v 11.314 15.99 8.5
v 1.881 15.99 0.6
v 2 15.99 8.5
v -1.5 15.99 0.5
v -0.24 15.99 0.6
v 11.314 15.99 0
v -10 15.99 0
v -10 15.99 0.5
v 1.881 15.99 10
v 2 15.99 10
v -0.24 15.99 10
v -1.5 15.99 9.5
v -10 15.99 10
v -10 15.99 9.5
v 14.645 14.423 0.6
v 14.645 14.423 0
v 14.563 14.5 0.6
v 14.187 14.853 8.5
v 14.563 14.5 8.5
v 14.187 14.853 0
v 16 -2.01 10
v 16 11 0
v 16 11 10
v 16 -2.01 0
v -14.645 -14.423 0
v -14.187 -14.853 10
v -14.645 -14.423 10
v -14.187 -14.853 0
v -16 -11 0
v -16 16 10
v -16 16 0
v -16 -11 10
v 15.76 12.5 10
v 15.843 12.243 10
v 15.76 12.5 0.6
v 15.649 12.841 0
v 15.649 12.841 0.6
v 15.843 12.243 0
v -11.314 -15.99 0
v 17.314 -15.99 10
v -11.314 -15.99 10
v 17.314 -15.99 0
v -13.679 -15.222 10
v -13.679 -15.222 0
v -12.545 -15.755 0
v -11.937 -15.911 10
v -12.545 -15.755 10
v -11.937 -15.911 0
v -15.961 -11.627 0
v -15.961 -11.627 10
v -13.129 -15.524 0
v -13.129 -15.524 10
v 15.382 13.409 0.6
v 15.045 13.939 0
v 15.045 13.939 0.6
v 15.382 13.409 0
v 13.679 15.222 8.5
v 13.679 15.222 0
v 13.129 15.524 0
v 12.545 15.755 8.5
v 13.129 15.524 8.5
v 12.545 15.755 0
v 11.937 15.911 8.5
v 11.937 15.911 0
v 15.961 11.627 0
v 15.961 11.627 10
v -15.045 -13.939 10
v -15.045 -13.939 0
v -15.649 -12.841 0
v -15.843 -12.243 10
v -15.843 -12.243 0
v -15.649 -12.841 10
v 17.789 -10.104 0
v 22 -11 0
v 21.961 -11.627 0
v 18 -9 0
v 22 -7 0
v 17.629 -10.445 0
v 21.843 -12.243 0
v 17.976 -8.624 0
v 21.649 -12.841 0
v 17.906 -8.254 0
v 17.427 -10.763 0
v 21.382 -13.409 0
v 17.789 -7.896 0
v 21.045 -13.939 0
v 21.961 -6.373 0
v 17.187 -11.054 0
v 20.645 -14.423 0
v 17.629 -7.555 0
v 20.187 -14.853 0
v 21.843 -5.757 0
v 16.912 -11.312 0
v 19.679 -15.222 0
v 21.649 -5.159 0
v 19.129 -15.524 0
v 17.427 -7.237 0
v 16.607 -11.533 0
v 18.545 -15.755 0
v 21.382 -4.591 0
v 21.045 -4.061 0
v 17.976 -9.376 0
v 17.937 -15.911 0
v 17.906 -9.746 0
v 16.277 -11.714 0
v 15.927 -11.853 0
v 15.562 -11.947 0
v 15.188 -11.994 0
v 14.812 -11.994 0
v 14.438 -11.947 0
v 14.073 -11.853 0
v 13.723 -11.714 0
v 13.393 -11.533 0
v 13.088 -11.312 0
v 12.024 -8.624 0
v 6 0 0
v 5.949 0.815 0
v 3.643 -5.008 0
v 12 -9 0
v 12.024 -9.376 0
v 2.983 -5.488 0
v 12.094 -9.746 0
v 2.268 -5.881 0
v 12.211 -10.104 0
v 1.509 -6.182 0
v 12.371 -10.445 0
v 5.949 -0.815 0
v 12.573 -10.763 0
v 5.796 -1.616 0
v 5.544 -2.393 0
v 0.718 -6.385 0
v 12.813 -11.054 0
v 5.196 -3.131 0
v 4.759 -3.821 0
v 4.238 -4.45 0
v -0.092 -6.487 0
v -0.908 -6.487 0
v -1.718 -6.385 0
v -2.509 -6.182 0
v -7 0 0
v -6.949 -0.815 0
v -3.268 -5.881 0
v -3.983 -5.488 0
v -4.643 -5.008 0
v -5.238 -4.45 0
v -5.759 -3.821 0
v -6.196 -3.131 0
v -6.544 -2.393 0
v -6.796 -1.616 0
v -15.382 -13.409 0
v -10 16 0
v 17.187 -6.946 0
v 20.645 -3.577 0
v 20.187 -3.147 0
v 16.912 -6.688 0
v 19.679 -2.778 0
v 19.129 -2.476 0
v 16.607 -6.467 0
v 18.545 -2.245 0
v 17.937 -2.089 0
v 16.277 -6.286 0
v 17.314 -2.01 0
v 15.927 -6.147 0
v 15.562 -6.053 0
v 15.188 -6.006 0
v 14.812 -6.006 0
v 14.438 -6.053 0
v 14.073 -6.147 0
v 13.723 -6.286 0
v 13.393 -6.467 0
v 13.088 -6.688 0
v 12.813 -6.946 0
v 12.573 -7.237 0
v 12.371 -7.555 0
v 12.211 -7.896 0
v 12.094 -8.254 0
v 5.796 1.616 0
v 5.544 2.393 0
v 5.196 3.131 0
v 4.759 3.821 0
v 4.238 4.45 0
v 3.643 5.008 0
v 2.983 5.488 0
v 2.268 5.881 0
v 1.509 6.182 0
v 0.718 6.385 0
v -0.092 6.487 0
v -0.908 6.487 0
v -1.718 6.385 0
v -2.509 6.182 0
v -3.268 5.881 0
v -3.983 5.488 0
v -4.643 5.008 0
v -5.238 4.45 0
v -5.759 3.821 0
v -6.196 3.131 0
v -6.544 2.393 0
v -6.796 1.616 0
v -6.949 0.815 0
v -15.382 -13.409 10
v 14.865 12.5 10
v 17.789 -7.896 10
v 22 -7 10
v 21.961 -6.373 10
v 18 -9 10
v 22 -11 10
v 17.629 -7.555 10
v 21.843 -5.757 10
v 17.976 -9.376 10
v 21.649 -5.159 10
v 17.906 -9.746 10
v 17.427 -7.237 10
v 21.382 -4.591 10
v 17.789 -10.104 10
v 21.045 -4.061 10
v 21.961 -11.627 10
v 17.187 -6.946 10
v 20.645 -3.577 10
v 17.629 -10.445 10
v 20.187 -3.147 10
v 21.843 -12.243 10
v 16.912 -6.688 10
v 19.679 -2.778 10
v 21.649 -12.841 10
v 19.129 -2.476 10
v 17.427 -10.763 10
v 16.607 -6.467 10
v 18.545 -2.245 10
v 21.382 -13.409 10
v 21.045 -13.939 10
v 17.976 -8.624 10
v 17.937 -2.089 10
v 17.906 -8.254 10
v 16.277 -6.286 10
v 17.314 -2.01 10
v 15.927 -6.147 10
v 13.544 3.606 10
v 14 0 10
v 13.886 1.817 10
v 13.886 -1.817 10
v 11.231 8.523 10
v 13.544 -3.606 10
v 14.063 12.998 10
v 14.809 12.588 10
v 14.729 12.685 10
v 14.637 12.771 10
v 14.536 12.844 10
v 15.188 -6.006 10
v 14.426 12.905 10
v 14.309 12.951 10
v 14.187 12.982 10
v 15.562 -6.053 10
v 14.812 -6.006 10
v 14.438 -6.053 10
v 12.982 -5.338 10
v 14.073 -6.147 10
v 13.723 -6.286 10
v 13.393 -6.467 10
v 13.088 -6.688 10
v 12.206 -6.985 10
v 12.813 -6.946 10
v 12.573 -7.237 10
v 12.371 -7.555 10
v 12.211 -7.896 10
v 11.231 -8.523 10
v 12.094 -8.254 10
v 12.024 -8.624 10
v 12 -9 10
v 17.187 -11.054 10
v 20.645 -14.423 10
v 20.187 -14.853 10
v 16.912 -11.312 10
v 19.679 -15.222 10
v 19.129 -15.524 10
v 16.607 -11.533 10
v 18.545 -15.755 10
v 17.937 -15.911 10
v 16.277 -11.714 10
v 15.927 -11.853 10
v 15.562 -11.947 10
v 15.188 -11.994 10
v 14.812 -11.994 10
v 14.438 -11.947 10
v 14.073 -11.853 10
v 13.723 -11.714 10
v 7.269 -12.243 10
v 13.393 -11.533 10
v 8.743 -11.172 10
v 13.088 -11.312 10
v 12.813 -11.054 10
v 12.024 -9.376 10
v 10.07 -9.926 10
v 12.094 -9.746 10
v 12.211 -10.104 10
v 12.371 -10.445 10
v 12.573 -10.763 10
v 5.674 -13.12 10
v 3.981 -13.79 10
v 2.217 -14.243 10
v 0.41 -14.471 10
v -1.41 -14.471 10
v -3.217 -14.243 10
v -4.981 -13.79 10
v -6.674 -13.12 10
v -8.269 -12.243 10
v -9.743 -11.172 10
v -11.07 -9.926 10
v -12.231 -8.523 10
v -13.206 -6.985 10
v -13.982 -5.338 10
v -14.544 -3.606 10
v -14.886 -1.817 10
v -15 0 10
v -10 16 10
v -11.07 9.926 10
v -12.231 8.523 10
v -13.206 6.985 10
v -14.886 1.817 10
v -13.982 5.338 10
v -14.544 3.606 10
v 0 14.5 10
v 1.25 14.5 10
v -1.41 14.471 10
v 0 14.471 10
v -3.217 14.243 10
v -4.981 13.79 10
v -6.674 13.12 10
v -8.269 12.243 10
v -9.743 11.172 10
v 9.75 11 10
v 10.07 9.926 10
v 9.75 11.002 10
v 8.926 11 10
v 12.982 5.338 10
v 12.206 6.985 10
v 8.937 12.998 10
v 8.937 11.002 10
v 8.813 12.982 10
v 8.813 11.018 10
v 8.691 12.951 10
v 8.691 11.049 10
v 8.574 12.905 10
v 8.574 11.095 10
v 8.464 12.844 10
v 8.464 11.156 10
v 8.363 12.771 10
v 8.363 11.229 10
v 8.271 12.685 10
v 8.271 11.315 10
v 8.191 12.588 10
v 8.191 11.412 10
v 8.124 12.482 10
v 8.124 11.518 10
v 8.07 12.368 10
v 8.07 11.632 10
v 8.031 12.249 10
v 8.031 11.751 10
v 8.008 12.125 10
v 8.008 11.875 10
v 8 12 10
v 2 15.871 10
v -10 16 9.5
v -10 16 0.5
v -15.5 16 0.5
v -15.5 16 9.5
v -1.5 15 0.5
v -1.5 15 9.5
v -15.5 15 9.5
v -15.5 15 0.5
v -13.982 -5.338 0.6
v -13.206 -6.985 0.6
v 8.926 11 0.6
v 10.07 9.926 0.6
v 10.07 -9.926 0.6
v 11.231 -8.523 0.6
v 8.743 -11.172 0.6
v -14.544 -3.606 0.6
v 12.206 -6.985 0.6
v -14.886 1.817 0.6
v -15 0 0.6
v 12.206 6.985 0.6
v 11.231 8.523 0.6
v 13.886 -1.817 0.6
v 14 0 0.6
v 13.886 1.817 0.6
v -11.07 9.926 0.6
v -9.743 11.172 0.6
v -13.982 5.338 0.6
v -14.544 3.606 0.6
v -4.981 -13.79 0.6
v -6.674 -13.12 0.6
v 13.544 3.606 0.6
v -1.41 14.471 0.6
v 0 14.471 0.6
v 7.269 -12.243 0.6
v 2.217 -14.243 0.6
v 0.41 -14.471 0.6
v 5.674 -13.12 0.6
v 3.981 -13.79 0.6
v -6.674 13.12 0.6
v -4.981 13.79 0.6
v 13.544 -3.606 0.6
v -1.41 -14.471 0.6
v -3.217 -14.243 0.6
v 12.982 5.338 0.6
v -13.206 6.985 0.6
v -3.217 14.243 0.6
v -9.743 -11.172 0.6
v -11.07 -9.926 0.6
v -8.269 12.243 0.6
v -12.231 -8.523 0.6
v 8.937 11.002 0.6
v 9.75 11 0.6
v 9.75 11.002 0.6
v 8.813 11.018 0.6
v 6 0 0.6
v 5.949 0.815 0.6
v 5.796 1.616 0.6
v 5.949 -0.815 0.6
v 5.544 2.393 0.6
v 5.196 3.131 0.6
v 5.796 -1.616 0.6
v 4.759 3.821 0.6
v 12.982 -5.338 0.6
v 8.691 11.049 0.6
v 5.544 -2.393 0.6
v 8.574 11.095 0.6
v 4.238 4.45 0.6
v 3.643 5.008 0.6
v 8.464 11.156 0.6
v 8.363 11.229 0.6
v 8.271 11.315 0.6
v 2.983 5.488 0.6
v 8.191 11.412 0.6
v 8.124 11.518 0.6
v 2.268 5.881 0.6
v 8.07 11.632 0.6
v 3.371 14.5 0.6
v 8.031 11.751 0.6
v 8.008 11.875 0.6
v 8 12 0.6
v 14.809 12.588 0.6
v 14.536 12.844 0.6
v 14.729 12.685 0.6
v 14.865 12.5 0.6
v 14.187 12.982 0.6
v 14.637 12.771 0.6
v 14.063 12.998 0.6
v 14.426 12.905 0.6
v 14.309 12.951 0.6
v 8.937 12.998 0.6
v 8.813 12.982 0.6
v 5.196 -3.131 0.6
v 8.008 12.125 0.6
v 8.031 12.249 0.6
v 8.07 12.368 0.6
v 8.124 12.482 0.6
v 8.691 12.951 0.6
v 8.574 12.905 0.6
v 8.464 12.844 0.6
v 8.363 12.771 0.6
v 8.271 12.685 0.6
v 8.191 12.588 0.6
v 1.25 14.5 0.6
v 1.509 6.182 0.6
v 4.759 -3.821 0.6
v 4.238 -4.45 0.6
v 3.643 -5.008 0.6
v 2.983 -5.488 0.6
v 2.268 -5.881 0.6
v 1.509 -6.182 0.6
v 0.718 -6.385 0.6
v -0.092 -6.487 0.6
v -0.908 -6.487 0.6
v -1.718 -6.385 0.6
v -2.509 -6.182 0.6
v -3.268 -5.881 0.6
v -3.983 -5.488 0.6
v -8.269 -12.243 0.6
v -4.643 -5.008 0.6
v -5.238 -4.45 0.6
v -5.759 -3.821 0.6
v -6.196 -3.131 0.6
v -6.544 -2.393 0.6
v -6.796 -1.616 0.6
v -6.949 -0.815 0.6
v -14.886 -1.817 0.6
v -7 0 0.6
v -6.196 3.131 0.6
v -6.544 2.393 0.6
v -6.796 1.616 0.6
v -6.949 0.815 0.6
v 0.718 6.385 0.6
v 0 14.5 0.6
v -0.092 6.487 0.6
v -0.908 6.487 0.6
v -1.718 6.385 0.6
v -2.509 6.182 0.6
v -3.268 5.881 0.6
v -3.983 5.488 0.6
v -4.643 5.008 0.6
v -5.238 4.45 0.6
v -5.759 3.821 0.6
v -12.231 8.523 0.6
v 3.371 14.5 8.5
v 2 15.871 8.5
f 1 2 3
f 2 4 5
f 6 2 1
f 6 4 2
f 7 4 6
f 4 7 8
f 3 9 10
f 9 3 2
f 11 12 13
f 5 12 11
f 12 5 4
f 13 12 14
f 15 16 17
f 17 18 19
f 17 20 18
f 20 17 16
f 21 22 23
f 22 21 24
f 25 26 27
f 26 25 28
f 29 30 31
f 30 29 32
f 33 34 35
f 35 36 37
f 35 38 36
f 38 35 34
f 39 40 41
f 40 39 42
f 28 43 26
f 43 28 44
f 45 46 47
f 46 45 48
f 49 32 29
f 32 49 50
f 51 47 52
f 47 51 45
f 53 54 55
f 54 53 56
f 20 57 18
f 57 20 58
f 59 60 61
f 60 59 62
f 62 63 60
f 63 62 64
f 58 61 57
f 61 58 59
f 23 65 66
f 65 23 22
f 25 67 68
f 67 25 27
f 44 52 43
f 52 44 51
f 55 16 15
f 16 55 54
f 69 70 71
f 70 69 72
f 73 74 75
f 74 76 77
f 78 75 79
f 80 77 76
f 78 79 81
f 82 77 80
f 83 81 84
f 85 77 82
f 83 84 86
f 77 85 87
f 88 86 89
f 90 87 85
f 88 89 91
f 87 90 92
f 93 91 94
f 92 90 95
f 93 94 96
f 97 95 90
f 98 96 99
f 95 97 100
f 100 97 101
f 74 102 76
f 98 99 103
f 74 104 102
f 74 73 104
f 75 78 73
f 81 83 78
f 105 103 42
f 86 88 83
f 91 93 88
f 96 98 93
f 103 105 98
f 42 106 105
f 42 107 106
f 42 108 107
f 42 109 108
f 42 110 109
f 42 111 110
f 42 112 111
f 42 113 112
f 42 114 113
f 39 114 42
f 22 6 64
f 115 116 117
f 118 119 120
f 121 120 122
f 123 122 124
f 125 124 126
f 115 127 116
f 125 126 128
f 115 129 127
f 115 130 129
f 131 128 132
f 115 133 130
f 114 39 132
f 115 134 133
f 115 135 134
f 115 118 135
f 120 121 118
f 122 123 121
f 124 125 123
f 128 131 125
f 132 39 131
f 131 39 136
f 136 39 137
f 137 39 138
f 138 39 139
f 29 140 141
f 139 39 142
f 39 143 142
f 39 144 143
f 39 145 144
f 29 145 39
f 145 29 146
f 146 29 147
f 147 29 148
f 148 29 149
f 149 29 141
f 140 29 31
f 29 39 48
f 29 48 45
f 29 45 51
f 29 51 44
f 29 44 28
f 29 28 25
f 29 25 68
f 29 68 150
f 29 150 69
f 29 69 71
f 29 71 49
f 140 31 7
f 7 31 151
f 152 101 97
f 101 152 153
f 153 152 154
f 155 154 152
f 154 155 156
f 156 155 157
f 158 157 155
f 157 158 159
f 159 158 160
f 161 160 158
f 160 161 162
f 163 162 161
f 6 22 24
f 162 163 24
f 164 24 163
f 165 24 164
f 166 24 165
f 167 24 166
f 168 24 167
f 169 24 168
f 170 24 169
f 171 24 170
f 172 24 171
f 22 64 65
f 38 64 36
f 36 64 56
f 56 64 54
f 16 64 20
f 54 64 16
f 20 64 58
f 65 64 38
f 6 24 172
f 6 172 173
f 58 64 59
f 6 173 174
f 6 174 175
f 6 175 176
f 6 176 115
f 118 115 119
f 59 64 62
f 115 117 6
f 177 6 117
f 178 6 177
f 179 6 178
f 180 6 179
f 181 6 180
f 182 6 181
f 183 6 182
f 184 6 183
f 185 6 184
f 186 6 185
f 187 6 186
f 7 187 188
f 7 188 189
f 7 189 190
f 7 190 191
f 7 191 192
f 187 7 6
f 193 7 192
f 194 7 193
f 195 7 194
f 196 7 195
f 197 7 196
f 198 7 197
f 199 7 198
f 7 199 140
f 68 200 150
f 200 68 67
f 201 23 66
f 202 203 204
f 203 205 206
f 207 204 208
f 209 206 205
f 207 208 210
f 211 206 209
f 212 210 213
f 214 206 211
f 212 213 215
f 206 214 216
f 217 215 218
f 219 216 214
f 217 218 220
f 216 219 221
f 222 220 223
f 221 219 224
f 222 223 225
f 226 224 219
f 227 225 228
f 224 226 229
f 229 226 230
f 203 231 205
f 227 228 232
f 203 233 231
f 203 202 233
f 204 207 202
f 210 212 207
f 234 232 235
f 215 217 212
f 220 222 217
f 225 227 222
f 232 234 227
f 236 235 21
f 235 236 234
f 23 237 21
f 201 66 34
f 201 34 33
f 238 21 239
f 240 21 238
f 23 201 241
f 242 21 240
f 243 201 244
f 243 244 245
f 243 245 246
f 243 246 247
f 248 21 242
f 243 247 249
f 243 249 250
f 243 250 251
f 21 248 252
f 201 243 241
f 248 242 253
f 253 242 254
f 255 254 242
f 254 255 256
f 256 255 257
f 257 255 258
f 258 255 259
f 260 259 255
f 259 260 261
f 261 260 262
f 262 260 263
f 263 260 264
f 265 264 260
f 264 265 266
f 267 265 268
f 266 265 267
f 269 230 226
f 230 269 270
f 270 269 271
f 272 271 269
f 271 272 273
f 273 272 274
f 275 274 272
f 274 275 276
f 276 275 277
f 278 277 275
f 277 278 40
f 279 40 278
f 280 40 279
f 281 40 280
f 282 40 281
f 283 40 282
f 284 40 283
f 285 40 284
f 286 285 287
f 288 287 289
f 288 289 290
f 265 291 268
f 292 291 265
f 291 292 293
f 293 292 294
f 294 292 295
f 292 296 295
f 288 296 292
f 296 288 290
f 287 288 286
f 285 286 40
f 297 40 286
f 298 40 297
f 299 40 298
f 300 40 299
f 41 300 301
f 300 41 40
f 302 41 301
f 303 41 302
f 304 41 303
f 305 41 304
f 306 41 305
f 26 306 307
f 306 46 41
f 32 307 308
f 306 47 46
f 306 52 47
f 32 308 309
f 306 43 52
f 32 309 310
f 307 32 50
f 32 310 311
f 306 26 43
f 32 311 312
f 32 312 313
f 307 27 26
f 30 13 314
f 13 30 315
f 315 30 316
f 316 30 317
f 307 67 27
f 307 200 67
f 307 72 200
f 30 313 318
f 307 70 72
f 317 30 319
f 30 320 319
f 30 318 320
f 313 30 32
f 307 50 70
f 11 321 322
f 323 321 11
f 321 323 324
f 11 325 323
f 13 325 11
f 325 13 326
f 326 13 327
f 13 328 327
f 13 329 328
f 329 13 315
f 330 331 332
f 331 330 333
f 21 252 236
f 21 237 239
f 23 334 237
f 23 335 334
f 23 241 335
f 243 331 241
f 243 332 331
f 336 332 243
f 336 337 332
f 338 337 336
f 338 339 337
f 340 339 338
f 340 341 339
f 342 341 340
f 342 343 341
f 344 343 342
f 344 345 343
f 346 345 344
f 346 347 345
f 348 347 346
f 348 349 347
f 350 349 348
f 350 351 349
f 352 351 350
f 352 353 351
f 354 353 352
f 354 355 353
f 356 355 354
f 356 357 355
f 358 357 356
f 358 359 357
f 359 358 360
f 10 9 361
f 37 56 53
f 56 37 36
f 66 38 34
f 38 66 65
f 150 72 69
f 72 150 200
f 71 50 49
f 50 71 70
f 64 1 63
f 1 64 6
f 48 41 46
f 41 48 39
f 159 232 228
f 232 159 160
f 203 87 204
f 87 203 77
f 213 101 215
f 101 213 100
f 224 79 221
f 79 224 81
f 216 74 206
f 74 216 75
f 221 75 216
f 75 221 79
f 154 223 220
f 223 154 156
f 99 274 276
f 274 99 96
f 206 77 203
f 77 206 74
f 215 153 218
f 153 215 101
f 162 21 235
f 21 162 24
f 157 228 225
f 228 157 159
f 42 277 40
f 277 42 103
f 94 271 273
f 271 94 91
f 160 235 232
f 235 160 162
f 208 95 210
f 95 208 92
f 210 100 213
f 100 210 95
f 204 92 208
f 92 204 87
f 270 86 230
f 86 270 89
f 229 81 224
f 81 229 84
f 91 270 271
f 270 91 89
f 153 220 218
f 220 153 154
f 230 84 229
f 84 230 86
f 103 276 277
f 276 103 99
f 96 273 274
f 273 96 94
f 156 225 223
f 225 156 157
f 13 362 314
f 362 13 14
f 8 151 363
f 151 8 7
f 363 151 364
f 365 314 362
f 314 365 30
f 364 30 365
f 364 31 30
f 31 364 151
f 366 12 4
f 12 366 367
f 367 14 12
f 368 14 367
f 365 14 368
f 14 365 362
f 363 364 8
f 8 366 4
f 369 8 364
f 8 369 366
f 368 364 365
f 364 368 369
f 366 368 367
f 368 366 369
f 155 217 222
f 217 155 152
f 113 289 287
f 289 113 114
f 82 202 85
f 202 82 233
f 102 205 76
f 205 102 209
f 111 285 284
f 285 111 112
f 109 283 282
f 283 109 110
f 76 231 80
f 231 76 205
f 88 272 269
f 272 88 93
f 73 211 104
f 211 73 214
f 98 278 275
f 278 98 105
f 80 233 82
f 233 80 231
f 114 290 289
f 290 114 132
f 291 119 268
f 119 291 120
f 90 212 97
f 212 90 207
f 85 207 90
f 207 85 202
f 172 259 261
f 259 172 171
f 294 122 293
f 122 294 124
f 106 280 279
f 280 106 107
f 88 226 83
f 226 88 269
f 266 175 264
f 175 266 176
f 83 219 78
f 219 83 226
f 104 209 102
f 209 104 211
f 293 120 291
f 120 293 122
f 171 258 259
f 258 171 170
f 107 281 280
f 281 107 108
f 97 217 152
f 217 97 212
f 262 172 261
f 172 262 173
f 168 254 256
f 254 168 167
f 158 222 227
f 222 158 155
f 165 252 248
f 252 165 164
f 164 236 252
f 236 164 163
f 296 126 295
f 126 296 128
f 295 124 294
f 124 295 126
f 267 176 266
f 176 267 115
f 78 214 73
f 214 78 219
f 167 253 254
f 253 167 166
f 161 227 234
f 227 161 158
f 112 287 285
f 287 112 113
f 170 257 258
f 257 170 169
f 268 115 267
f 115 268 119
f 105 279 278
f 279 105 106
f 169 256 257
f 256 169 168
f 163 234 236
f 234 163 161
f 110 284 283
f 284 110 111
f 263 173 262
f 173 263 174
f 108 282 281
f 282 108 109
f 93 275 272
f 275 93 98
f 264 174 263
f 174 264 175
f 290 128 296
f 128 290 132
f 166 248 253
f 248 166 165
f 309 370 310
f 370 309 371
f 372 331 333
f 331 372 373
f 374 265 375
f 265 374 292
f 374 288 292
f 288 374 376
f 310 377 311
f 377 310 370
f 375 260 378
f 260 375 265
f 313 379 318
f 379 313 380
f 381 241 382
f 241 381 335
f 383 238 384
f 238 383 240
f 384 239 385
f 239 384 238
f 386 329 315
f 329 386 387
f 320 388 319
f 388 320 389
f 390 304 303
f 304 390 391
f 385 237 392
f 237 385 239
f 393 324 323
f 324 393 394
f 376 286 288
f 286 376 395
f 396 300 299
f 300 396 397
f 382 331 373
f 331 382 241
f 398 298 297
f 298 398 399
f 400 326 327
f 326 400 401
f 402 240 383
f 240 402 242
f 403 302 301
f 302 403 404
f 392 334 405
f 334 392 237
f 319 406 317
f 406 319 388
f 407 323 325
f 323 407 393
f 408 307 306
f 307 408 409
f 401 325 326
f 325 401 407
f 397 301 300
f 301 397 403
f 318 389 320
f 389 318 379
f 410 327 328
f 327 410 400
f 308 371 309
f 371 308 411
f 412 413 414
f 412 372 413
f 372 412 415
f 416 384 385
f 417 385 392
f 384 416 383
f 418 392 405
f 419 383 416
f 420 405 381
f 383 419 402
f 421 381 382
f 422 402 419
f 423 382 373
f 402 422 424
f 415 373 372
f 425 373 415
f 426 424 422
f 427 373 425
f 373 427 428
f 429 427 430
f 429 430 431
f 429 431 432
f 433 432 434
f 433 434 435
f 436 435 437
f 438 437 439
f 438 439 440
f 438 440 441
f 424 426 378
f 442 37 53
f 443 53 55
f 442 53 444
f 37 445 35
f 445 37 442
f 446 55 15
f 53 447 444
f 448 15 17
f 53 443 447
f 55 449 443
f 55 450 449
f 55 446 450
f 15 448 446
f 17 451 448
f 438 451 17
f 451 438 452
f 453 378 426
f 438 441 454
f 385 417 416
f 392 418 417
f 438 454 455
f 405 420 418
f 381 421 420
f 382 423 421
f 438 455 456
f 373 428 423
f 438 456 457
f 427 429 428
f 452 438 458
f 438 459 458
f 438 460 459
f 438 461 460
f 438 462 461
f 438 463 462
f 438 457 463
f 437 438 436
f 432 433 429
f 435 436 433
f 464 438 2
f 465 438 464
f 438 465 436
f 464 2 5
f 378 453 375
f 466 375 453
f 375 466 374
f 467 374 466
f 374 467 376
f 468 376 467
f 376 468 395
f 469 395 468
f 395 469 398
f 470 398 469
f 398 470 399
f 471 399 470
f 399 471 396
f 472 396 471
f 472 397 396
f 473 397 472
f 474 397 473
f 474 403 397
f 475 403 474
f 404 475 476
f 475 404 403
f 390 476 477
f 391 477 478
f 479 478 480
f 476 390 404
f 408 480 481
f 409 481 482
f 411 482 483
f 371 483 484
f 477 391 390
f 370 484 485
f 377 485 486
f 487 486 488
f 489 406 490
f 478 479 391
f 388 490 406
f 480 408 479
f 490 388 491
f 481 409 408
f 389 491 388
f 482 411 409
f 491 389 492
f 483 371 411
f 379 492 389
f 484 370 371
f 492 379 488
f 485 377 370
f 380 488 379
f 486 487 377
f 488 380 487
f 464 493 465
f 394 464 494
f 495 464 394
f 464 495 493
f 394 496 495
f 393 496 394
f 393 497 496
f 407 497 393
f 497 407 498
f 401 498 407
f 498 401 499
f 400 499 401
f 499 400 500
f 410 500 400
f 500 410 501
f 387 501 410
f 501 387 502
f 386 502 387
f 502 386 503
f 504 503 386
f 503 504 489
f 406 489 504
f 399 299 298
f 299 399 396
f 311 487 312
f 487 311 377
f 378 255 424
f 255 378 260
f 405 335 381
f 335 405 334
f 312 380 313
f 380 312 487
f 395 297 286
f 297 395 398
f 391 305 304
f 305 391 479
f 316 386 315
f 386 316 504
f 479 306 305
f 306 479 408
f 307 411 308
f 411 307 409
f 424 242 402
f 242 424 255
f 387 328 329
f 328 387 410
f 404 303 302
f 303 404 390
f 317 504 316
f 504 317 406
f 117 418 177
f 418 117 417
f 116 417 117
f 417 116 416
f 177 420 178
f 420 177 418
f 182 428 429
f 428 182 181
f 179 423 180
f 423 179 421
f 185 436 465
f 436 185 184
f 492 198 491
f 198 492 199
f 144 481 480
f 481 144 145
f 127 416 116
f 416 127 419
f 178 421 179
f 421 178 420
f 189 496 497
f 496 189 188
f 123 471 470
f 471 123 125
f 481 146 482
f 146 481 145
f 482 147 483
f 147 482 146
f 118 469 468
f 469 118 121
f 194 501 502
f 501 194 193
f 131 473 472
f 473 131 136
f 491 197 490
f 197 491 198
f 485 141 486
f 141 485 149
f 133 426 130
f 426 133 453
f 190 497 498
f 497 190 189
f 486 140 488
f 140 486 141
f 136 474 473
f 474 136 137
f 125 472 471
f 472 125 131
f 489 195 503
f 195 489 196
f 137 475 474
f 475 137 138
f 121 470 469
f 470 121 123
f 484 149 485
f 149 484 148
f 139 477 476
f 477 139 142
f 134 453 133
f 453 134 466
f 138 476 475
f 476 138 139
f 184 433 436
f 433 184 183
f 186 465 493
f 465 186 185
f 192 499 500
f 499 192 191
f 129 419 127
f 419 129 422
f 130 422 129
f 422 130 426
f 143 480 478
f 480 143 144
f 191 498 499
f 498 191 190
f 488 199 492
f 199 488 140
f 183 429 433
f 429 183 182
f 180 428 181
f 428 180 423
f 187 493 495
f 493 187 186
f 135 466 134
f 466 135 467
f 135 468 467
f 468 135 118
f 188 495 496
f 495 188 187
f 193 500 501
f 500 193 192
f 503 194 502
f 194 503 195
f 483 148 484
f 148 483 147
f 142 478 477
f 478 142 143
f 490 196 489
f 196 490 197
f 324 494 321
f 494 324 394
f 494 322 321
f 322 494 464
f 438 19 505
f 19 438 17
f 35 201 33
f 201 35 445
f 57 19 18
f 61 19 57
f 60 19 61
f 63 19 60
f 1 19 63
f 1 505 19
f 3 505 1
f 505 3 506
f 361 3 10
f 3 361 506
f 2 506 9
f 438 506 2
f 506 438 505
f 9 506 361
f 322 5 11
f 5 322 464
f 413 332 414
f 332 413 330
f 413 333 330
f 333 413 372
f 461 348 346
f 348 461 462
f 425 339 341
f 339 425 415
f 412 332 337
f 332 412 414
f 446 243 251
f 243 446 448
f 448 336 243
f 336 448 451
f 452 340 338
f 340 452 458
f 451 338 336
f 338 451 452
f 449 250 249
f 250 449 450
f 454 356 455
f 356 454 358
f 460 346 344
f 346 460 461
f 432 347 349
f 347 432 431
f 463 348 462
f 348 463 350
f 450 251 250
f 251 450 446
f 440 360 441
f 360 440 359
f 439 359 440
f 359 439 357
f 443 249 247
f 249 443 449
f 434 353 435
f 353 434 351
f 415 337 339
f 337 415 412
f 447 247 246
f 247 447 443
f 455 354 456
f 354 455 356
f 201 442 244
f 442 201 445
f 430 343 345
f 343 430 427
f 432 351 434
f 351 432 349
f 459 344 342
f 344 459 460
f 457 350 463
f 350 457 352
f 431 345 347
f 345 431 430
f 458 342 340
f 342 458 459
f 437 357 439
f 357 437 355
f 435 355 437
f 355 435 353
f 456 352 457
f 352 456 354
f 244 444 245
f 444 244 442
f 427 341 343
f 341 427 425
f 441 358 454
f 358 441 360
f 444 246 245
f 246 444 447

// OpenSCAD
$fn = 50;


union() {
	difference() {
		union() {
			translate(v = [0, 0, 0]) {
				rotate(a = [0, 0, 0]) {
					hull() {
						translate(v = [-11.0000000000, 11.0000000000, 0]) {
							rotate(a = [0, 0, 0]) {
								translate(v = [0, 0, 0]) {
									rotate(a = [0, 0, 0]) {
										cylinder(h = 10, r = 5);
									}
								}
							}
						}
						translate(v = [11.0000000000, 11.0000000000, 0]) {
							rotate(a = [0, 0, 0]) {
								translate(v = [0, 0, 0]) {
									rotate(a = [0, 0, 0]) {
										cylinder(h = 10, r = 5);
									}
								}
							}
						}
						translate(v = [-11.0000000000, -11.0000000000, 0]) {
							rotate(a = [0, 0, 0]) {
								translate(v = [0, 0, 0]) {
									rotate(a = [0, 0, 0]) {
										cylinder(h = 10, r = 5);
									}
								}
							}
						}
						translate(v = [11.0000000000, -11.0000000000, 0]) {
							rotate(a = [0, 0, 0]) {
								translate(v = [0, 0, 0]) {
									rotate(a = [0, 0, 0]) {
										cylinder(h = 10, r = 5);
									}
								}
							}
						}
					}
				}
			}
			translate(v = [7.5000000000, -9.0000000000, 0]) {
				rotate(a = [0, 0, 0]) {
					hull() {
						translate(v = [-9.5000000000, 2.0000000000, 0]) {
							rotate(a = [0, 0, 0]) {
								translate(v = [0, 0, 0]) {
									rotate(a = [0, 0, 0]) {
										cylinder(h = 10, r = 5);
									}
								}
							}
						}
						translate(v = [9.5000000000, 2.0000000000, 0]) {
							rotate(a = [0, 0, 0]) {
								translate(v = [0, 0, 0]) {
									rotate(a = [0, 0, 0]) {
										cylinder(h = 10, r = 5);
									}
								}
							}
						}
						translate(v = [-9.5000000000, -2.0000000000, 0]) {
							rotate(a = [0, 0, 0]) {
								translate(v = [0, 0, 0]) {
									rotate(a = [0, 0, 0]) {
										cylinder(h = 10, r = 5);
									}
								}
							}
						}
						translate(v = [9.5000000000, -2.0000000000, 0]) {
							rotate(a = [0, 0, 0]) {
								translate(v = [0, 0, 0]) {
									rotate(a = [0, 0, 0]) {
										cylinder(h = 10, r = 5);
									}
								}
							}
						}
					}
				}
			}
			translate(v = [-16.0000000000, 10.0000000000, 0]) {
				rotate(a = [0, 0, 0]) {
					cube(size = [6, 6, 10]);
				}
			}
		}
		union() {
			translate(v = [-15.5000000000, 15.0000000000, 0.5000000000]) {
				rotate(a = [0, 0, 0]) {
					cube(size = [14, 1, 9.0000000000]);
				}
			}
			translate(v = [15.0000000000, -9.0000000000, -125.0000000000]) {
				rotate(a = [0, 0, 0]) {
					cylinder(h = 250, r = 3.0000000000);
				}
			}
			translate(v = [-0.5000000000, 0.0000000000, 0.6000000000]) {
				rotate(a = [0, 0, 0]) {
					cylinder(h = 12.4000000000, r = 14.5000000000);
				}
			}
			translate(v = [-0.5000000000, 0.0000000000, -5.0000000000]) {
				rotate(a = [0, 0, 0]) {
					cylinder(h = 10, r = 6.5000000000);
				}
			}
			translate(v = [0.0000000000, 12.5000000000, 0.6000000000]) {
				rotate(a = [0, 0, 0]) {
					cube(size = [16.0000000000, 2, 12.4000000000]);
				}
			}
			translate(v = [2.0000000000, 12.5000000000, 8.5000000000]) {
				rotate(a = [0, 0, 0]) {
					cube(size = [14.0000000000, 5, 1.5000000000]);
				}
			}
			translate(v = [-3.0000000000, 18.7500000000, 0.6000000000]) {
				rotate(a = [0, 0, -45]) {
					cube(size = [10, 1.5000000000, 12.4000000000]);
				}
			}
			translate(v = [2.2500000000, 11.0000000000, 0.6000000000]) {
				rotate(a = [0, 0, 0]) {
					cube(size = [7.5000000000, 2, 9.4000000000]);
				}
			}
		}
	}
	union() {
		translate(v = [11.5000000000, 12, 0]) {
			rotate(a = [0, 0, 0]) {
				hull() {
					translate(v = [2.5000000000, 0, 0]) {
						rotate(a = [0, 0, 0]) {
							translate(v = [0, 0, 0]) {
								rotate(a = [0, 0, 0]) {
									cylinder(h = 10, r = 1.0000000000);
								}
							}
						}
					}
					translate(v = [-2.5000000000, 0, 0]) {
						rotate(a = [0, 0, 0]) {
							translate(v = [0, 0, 0]) {
								rotate(a = [0, 0, 0]) {
									cylinder(h = 10, r = 1.0000000000);
								}
							}
						}
					}
				}
			}
		}
	}
}
